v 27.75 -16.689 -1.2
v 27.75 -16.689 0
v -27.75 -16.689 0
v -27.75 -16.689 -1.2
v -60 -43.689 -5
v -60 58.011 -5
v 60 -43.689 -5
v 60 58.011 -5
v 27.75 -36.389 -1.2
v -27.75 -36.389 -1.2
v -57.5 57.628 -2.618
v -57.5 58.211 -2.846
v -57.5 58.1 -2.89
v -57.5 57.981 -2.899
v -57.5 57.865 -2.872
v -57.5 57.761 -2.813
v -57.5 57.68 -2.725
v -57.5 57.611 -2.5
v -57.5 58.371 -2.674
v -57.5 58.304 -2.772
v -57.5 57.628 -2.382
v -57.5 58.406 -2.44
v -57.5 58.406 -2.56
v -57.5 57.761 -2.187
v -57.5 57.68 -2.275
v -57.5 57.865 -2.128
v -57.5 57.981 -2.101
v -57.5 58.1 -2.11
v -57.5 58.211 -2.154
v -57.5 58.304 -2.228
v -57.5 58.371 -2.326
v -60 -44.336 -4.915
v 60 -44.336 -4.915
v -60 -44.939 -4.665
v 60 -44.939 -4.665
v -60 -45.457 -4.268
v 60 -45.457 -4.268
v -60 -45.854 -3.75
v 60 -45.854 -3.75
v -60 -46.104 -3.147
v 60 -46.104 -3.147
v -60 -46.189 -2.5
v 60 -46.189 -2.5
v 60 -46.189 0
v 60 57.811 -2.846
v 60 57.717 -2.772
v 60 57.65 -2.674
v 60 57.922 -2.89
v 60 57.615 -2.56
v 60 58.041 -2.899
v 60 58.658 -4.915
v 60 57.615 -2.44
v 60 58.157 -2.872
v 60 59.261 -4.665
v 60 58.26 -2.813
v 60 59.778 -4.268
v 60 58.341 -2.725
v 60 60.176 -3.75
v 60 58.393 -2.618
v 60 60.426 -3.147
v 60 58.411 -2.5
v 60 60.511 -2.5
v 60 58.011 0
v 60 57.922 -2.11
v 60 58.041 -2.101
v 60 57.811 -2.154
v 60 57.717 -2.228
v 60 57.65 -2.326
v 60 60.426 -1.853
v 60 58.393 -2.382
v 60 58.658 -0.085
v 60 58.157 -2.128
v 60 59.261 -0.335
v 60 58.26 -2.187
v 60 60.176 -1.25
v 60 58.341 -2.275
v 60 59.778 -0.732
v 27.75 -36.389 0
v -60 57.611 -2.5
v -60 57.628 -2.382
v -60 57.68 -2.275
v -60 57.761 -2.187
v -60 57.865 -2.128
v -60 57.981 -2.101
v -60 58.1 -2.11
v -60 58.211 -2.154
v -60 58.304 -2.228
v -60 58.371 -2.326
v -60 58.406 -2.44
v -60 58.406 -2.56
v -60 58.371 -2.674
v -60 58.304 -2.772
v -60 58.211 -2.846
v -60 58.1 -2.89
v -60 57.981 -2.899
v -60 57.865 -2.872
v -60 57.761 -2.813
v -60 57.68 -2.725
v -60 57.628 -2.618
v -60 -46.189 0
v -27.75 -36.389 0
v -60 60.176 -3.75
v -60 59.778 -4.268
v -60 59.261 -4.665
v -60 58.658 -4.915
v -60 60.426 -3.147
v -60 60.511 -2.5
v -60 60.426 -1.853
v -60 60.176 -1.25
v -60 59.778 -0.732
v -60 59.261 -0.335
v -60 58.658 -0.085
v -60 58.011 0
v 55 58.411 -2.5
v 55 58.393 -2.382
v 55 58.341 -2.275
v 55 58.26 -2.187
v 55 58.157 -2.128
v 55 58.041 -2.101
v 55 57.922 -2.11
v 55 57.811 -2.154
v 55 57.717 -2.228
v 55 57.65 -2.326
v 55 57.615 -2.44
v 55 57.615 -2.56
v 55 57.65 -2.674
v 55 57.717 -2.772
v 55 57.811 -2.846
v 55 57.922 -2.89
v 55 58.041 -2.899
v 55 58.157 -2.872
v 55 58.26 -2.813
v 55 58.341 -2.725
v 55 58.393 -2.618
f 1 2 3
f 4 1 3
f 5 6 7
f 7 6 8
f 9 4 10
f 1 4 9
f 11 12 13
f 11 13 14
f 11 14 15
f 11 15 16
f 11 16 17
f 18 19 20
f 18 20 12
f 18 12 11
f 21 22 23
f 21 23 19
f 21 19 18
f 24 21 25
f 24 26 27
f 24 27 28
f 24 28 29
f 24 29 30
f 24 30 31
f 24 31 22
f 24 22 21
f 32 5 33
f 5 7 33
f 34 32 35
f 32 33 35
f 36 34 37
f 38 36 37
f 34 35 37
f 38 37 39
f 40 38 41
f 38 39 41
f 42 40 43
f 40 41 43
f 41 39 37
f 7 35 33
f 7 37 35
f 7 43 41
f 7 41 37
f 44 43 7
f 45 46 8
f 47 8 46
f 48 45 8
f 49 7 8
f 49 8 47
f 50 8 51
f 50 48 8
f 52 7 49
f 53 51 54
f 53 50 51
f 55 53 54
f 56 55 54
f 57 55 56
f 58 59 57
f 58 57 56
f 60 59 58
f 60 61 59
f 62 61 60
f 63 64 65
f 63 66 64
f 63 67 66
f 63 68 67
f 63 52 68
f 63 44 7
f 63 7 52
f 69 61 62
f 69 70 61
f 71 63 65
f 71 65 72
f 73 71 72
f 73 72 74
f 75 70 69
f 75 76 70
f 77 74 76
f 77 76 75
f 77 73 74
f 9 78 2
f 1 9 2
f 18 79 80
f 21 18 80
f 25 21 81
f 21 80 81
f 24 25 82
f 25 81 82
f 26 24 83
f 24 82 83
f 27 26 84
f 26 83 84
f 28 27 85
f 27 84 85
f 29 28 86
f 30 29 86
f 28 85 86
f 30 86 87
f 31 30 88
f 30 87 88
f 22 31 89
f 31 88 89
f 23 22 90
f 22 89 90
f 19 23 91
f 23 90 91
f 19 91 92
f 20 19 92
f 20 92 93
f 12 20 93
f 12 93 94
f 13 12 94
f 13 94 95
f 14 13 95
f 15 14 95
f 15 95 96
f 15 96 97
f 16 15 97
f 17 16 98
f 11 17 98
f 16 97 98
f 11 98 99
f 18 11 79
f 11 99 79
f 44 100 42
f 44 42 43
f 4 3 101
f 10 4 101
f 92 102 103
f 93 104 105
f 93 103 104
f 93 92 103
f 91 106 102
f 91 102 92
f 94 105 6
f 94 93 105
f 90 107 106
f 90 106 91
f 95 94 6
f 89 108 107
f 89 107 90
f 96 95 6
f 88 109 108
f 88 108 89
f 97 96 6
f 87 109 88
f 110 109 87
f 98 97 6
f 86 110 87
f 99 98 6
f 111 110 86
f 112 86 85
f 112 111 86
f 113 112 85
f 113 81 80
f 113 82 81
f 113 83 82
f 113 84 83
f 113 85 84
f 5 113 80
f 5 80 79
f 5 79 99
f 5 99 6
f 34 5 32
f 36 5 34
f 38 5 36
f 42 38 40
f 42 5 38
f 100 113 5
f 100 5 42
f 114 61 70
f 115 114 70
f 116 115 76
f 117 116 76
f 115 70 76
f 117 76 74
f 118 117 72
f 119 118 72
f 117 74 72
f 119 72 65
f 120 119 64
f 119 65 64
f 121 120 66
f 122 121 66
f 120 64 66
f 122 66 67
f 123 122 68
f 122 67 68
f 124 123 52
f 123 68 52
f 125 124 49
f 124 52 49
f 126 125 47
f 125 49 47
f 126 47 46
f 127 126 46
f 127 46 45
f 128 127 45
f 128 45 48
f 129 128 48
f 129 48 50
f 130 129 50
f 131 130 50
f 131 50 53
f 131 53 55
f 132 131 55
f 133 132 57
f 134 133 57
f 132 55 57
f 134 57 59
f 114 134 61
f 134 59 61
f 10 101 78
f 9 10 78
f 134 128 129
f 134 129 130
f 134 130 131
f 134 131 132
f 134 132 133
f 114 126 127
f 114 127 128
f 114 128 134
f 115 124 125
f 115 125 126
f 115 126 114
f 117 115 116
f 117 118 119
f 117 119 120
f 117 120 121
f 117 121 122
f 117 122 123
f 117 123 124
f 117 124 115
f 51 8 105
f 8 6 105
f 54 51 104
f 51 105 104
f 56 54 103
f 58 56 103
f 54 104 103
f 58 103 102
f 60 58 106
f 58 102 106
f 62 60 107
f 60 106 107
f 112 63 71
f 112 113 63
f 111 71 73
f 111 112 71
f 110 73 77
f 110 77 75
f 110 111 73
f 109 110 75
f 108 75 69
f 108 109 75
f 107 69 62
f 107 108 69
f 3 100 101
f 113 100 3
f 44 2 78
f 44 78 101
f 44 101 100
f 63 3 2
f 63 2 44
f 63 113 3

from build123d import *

# Parameters (mm, degrees)
F2_DEPTH = 5
F3_DEPTH = 1.2
F4_R     = 0.4
F5_DEPTH = 2.5
F6_R     = 0.4
F7_DEPTH = 5
F8_R     = 2.49999
F9_R     = 2.5


# Not quite as in the source:
# - a fillet or chamfer is up to 0.001 mm smaller than in the source, because OpenCascade refuses the exact size


with BuildPart() as f2:
    # F1 (on Top) → F2 (new body)
    with BuildSketch(Plane.XY):
        Polygon((-60, -46.1892857143), (-0.7, -46.1892857143), (60, -46.1892857143), (60, 60.5107142857), (0, 60.5107142857), (-60, 60.5107142857), align=None)
        Polygon((-27.75, -16.6892857143), (0, -16.6892857143), (27.75, -16.6892857143), (27.75, -36.3892857143), (-0.7, -36.3892857143), (-27.75, -36.3892857143), align=None, mode=Mode.SUBTRACT)
        Polygon((27.75, -16.6892857143), (0, -16.6892857143), (-27.75, -16.6892857143), (-27.75, -36.3892857143), (-0.7, -36.3892857143), (27.75, -36.3892857143), align=None)
    extrude(amount=-F2_DEPTH)

    # F1 (on Top) → F3 (cut)
    with BuildSketch(Plane.XY):
        Polygon((27.75, -16.6892857143), (0, -16.6892857143), (-27.75, -16.6892857143), (-27.75, -36.3892857143), (-0.7, -36.3892857143), (27.75, -36.3892857143), align=None)
    extrude(amount=-F3_DEPTH, mode=Mode.SUBTRACT)

    # F4 (on face) → F5 (cut, symmetric)
    with BuildSketch(Plane(origin=(-60, 0, 0), x_dir=(0, -1, 0), z_dir=(-1, 0, 0))):
        with Locations((-58.0107142857, -2.5)):
            Circle(F4_R)
    extrude(amount=F5_DEPTH, both=True, mode=Mode.SUBTRACT)

    # F6 (on face) → F7 (cut)
    with BuildSketch(Plane.YZ.offset(60)):
        with Locations((58.0107142857, -2.5)):
            Circle(F6_R)
    extrude(amount=-F7_DEPTH, mode=Mode.SUBTRACT)

    # F8 (radius 2.5 in the source; OpenCascade refuses exactly that, so slightly less here)
    f8_edges = [f2.edges().sort_by_distance(p)[0] for p in [
        (0, 60.510714, 0),
        (0, 60.510714, -5),
    ]]
    fillet(f8_edges, radius=F8_R)

    # F9
    f9_edges = [f2.edges().sort_by_distance(p)[0] for p in [
        (0, -46.189286, -5),
    ]]
    fillet(f9_edges, radius=F9_R)


solid = f2.part
